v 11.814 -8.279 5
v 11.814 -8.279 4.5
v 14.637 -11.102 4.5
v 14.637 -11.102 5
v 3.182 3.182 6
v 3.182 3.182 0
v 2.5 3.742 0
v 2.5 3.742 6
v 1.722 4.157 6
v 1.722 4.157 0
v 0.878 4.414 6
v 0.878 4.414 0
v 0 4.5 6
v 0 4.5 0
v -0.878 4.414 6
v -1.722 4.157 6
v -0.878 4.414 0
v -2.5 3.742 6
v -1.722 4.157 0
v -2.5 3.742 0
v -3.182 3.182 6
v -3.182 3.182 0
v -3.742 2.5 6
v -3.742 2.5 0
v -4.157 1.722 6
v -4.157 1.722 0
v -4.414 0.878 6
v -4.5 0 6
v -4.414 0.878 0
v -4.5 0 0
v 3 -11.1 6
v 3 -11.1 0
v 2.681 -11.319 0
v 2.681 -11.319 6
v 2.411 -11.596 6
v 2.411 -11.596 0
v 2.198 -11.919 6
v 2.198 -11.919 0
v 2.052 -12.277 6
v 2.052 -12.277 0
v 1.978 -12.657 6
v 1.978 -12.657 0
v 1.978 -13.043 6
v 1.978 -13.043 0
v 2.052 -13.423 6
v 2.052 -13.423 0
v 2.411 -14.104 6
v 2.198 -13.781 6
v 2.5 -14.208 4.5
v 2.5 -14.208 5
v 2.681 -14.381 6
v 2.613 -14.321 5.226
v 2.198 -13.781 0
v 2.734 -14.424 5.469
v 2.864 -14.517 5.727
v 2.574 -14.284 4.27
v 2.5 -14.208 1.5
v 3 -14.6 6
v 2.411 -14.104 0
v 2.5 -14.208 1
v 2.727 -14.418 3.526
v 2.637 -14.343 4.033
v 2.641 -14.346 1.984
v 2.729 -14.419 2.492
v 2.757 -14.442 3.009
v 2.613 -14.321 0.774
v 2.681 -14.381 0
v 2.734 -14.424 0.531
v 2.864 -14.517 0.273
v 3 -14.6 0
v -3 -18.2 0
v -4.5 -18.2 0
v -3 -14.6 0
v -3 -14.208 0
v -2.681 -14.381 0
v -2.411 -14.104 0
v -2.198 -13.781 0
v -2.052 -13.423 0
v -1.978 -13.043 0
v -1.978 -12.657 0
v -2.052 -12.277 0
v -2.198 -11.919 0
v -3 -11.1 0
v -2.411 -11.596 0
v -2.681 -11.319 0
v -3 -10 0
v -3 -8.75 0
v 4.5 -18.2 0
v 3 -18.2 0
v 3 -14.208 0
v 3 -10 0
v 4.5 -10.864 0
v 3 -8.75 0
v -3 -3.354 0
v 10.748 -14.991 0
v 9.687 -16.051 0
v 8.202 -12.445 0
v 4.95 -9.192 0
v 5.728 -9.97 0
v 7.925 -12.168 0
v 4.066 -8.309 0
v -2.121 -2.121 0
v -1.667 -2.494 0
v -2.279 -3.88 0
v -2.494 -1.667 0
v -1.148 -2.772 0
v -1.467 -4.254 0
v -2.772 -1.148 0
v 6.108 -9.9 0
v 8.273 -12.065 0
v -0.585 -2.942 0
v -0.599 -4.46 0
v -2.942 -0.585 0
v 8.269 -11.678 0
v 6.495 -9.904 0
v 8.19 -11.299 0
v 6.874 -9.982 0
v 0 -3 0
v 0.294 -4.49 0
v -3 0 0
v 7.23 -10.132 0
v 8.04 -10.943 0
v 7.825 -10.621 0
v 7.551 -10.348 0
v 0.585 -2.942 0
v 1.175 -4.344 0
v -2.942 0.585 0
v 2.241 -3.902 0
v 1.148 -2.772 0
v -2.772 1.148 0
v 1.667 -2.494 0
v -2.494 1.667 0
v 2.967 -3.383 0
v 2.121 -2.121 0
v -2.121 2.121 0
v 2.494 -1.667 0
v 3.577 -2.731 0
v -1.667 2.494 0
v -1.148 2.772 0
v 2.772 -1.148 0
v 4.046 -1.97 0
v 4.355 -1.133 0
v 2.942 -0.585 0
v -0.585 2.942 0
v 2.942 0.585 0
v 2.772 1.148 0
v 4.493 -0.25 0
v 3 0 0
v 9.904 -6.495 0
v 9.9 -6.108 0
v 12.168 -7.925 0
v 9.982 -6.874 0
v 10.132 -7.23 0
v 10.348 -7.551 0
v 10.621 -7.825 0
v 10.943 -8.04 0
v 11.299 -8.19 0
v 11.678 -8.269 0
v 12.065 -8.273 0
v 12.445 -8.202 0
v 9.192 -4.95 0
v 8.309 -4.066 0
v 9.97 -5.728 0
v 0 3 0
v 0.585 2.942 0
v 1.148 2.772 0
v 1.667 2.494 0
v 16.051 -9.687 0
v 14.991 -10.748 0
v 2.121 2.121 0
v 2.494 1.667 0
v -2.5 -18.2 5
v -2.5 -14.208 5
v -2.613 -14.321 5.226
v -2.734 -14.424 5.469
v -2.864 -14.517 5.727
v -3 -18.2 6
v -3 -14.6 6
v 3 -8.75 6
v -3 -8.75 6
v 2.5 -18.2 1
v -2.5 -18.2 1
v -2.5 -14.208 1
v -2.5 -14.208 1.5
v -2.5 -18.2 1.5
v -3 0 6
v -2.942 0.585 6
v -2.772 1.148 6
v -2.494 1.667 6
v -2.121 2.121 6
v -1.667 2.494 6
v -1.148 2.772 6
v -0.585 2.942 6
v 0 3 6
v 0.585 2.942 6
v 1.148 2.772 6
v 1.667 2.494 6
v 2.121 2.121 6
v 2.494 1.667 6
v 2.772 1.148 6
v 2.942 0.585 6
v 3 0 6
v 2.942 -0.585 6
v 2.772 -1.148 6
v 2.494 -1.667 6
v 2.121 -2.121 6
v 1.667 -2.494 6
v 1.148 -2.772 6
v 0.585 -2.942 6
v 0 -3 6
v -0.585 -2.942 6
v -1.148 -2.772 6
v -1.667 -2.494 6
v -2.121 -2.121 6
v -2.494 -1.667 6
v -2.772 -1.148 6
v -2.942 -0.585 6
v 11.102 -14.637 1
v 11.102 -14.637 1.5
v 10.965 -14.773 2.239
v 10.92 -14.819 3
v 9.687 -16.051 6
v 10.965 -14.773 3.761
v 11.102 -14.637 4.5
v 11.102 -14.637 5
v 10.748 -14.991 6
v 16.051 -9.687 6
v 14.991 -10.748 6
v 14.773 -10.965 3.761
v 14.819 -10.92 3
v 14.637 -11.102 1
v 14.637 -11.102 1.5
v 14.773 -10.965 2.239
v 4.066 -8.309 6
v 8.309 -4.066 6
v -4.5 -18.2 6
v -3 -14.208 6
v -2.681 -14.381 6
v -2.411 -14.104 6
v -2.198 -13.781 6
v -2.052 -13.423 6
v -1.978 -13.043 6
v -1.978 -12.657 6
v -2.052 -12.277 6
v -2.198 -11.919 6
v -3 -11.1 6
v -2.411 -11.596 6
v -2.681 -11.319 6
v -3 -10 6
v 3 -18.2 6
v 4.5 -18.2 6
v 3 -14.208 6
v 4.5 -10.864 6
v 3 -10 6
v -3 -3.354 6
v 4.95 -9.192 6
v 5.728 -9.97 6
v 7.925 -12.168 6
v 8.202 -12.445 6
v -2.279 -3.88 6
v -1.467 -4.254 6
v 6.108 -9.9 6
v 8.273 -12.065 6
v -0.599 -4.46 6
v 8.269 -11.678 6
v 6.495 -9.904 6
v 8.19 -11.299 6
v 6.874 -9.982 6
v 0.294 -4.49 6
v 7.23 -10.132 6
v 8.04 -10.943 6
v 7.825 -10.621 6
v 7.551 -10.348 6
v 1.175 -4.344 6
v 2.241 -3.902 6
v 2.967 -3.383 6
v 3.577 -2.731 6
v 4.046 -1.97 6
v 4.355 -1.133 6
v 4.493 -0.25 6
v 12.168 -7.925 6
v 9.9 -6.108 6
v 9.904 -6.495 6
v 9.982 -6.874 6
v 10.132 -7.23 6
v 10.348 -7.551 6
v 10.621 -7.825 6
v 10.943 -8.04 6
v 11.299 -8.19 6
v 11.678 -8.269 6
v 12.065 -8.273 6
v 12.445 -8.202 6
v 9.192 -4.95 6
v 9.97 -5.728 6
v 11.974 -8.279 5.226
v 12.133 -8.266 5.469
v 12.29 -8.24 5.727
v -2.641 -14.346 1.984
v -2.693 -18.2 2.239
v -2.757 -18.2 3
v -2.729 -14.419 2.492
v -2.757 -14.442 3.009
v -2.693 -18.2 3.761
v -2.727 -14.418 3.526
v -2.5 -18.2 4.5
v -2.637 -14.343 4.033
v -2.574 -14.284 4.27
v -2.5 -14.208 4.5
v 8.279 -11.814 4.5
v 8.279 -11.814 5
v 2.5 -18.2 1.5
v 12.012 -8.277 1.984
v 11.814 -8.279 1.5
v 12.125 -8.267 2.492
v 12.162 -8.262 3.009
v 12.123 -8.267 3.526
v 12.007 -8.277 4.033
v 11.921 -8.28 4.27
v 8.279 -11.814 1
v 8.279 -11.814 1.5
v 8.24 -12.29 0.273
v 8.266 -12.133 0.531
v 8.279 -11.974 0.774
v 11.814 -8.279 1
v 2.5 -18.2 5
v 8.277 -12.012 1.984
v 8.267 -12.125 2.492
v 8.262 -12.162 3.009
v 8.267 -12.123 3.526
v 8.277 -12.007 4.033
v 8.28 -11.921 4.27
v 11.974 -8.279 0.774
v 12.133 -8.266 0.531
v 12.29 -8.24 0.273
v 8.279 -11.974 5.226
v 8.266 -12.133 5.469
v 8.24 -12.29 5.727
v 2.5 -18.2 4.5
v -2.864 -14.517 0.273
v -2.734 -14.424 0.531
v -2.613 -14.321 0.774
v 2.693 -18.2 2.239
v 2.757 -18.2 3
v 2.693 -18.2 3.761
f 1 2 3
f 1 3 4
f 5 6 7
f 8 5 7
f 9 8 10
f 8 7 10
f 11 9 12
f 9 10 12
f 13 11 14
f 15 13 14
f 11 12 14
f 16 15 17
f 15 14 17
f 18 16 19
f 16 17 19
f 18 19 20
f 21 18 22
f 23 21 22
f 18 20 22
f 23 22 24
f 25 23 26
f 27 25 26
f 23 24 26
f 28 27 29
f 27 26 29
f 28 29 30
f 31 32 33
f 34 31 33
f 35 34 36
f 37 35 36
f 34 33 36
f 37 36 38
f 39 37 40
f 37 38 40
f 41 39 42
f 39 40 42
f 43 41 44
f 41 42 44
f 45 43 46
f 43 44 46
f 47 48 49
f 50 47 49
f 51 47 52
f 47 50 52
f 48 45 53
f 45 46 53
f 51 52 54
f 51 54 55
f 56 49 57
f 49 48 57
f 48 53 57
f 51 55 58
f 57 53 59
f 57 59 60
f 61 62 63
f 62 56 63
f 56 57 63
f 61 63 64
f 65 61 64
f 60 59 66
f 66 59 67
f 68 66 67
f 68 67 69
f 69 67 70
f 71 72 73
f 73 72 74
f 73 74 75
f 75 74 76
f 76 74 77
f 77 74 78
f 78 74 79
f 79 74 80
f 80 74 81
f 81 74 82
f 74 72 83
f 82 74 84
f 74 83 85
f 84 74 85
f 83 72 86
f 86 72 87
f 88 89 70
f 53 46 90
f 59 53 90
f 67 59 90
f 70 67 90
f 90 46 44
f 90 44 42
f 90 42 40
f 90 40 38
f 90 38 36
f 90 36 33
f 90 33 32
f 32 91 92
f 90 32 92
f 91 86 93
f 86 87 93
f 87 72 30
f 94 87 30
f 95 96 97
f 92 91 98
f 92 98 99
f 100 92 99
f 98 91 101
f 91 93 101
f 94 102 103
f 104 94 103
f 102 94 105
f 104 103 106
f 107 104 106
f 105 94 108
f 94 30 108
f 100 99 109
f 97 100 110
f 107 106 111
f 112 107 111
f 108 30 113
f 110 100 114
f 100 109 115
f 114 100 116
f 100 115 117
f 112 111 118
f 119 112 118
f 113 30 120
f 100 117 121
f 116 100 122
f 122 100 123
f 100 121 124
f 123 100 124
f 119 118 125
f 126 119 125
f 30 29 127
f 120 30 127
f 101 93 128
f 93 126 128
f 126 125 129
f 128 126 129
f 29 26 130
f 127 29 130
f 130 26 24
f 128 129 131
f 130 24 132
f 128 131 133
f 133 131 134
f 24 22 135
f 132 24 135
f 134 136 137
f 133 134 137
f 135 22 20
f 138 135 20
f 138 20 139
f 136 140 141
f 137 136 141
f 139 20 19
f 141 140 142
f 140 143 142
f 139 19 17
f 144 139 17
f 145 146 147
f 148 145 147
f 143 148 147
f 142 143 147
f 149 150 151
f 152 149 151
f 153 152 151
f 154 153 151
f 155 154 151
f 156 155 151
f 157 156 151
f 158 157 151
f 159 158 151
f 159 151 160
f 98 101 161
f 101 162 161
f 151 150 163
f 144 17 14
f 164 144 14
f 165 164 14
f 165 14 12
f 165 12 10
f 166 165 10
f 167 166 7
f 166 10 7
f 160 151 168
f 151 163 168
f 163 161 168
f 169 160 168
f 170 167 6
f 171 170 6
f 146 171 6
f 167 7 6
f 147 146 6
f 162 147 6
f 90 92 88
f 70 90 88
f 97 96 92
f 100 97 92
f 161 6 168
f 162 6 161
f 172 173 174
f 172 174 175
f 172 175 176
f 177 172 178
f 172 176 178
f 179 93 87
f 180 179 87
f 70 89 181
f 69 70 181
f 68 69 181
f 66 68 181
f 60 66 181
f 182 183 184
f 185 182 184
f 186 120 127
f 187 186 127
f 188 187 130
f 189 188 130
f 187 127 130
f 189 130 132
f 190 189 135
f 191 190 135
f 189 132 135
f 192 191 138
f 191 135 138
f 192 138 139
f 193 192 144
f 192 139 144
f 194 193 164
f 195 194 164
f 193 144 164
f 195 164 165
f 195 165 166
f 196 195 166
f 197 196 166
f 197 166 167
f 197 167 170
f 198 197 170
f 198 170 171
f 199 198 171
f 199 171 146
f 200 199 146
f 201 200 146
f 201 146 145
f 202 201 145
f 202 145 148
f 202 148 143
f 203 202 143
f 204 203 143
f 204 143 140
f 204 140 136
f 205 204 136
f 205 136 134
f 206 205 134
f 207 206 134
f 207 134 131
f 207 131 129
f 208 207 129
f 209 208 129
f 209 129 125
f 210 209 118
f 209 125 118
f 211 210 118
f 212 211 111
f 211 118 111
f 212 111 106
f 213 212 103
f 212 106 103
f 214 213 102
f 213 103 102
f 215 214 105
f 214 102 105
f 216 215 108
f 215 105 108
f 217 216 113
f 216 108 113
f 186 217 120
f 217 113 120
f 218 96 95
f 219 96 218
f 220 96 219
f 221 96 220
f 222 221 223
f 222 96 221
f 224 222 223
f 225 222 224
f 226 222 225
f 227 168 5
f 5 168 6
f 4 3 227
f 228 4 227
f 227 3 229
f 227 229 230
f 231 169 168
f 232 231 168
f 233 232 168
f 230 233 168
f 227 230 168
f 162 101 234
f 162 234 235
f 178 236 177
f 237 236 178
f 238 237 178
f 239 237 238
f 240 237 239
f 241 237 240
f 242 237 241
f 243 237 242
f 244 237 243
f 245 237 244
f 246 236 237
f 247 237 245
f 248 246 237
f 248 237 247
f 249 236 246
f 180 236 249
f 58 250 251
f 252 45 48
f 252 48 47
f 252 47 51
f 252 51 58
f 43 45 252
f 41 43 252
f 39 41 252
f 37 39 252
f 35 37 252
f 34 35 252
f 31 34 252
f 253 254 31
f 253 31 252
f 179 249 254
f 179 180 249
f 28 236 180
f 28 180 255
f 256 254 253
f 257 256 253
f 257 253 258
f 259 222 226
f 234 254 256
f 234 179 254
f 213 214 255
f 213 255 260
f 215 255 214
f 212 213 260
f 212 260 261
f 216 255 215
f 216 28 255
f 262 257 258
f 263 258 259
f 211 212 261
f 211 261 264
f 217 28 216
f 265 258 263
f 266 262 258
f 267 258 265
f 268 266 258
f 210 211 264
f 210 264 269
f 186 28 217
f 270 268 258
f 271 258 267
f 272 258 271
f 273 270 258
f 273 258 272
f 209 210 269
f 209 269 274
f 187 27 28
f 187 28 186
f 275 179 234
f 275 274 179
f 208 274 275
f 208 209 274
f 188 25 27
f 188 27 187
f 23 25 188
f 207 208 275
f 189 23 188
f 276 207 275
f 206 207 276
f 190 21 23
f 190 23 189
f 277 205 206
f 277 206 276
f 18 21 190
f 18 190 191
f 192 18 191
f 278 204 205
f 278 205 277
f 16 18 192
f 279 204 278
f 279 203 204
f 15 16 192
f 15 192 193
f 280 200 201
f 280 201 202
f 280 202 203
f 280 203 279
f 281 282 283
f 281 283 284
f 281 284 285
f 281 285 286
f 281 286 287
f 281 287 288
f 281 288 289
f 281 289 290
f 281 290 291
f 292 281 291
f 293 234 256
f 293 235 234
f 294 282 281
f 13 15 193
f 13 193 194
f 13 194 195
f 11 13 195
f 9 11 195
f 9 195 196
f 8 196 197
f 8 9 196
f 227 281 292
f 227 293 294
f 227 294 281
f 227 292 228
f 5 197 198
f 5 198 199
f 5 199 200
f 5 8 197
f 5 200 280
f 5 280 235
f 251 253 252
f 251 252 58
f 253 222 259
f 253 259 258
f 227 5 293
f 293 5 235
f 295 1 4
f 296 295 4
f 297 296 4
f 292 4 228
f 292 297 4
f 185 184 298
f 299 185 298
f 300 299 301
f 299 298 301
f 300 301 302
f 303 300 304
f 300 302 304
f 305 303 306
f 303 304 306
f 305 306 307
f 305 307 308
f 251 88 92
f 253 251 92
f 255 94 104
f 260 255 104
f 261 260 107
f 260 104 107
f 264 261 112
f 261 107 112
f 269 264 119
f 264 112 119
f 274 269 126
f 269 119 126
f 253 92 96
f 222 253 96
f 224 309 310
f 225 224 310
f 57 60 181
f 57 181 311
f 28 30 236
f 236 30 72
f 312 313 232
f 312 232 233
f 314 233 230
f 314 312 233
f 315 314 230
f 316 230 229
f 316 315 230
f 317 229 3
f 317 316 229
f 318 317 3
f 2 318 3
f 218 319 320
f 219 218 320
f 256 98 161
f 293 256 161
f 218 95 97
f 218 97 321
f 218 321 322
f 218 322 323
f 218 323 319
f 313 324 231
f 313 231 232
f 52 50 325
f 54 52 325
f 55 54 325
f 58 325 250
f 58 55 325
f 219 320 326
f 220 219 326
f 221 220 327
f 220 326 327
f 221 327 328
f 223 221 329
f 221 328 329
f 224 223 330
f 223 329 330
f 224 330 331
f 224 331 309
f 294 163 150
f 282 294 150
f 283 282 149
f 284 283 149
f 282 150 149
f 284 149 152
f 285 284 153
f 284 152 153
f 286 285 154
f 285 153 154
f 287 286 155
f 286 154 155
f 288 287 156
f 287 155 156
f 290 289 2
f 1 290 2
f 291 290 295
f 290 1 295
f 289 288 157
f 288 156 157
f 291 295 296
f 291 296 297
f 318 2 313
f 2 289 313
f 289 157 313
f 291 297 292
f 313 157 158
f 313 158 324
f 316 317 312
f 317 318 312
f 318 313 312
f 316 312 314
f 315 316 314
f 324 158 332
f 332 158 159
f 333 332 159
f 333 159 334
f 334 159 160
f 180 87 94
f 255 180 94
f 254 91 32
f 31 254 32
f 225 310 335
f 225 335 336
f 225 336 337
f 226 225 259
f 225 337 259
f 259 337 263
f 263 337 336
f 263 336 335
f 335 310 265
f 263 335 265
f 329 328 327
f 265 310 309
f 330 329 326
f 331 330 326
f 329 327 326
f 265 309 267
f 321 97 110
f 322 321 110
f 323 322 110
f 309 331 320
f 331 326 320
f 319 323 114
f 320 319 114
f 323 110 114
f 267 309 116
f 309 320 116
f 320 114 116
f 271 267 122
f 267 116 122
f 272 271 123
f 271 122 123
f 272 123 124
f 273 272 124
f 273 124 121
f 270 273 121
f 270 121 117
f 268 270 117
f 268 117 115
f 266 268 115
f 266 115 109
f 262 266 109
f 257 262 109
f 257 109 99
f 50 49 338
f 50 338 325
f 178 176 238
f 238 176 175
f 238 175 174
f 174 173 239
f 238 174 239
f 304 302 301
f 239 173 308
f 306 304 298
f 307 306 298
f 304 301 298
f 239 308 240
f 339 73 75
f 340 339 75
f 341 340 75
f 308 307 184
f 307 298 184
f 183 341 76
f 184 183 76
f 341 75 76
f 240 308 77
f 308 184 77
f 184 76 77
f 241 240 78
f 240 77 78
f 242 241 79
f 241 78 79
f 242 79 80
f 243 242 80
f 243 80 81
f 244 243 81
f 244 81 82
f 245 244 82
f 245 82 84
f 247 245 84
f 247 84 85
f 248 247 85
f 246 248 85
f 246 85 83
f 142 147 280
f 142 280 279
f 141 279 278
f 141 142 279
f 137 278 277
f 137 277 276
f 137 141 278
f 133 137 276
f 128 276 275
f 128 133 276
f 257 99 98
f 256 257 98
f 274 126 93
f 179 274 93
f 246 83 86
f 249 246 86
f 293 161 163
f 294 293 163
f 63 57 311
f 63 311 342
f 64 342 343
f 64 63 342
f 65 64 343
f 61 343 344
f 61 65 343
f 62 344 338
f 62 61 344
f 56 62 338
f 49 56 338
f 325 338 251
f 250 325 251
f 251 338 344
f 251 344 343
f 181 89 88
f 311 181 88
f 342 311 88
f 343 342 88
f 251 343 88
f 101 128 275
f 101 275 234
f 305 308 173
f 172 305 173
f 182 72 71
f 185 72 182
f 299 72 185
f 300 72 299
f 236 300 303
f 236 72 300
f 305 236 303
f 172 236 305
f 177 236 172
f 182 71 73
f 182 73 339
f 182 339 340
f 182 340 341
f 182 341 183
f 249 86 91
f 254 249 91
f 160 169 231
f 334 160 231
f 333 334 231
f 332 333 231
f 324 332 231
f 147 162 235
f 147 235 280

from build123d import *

# Parameters (mm, degrees)
EXTRUDE_1_DEPTH          = 6
EXTRUDE_2_REACH          = 25.907
PATTERN_CIRCULAR_1_COUNT = 2
PATTERN_CIRCULAR_1_ANGLE = 45
SKETCH_4_R               = 3
CUT_EXTRUDE_2_DEPTH      = 25.997699991


with BuildPart() as part:
    # 草图1 → 凸台-拉伸1 (new body)
    with BuildSketch(Plane.XY):
        with BuildLine():
            Line((-4.5, 0), (-4.5, -18.2))
            Line((-4.5, -18.2), (-3, -18.2))
            Line((-3, -18.2), (-3, -14.6))
            ThreePointArc((-3, -14.6), (-1.968245837, -12.85), (-3, -11.1))
            Line((-3, -11.1), (-3, -10))
            Line((-3, -10), (3, -10))
            Line((3, -10), (3, -11.1))
            ThreePointArc((3, -11.1), (1.968245837, -12.85), (3, -14.6))
            Line((3, -14.6), (3, -18.2))
            Line((3, -18.2), (4.5, -18.2))
            Line((4.5, -18.2), (4.5, 0))
            ThreePointArc((4.5, 0), (0, 4.5), (-4.5, 0))
        make_face()
    extrude_1 = extrude(amount=EXTRUDE_1_DEPTH)

    # 草图3 → 凸台-拉伸2 (add, up to next)
    with BuildSketch(Plane.XZ.offset(18.2), mode=Mode.PRIVATE) as extrude_2_sk1:
        with BuildLine():
            Line((-3, 6), (-3, 0))
            Line((-3, 0), (-2.5, 1))
            Line((-2.5, 1), (-2.5, 1.5))
            ThreePointArc((-2.5, 1.5), (-2.757359313, 3), (-2.5, 4.5))
            Line((-2.5, 4.5), (-2.5, 5))
            Line((-2.5, 5), (-3, 6))
        make_face()
    extrude_2_tool1 = extrude(extrude_2_sk1.sketch, amount=-EXTRUDE_2_REACH, mode=Mode.PRIVATE) - part.part
    # 草图3 → 凸台-拉伸2 (add, up to next)
    with BuildSketch(Plane.XZ.offset(18.2), mode=Mode.PRIVATE) as extrude_2_sk2:
        with BuildLine():
            Line((3, 0), (2.5, 1))
            Line((2.5, 1), (2.5, 1.5))
            ThreePointArc((2.5, 1.5), (2.757359313, 3), (2.5, 4.5))
            Line((2.5, 4.5), (2.5, 5))
            Line((2.5, 5), (3, 6))
            Line((3, 6), (3, 0))
        make_face()
    extrude_2_tool2 = extrude(extrude_2_sk2.sketch, amount=-EXTRUDE_2_REACH, mode=Mode.PRIVATE) - part.part
    extrude_2_1 = extrude_2_tool1.solids().sort_by_distance((-2.809362, -18.2, 3))[0]
    add(extrude_2_1)
    extrude_2_2 = extrude_2_tool2.solids().sort_by_distance((2.809362, -18.2, 3))[0]
    add(extrude_2_2)
    extrude_2 = extrude_2_1 + extrude_2_2  # 凸台-拉伸2 as one shape, for the pattern or mirror that repeats it

    # 阵列(圆周)1: 凸台-拉伸1, 凸台-拉伸2 ×2 about axis
    pattern_circular_1_axis = Axis((0, 0, 0), (0, 0, 1))
    add([extrude_1.rotate(pattern_circular_1_axis, i * PATTERN_CIRCULAR_1_ANGLE / (PATTERN_CIRCULAR_1_COUNT - 1)) for i in range(1, PATTERN_CIRCULAR_1_COUNT)])
    add([extrude_2.rotate(pattern_circular_1_axis, i * PATTERN_CIRCULAR_1_ANGLE / (PATTERN_CIRCULAR_1_COUNT - 1)) for i in range(1, PATTERN_CIRCULAR_1_COUNT)])

    # 草图4 → 切除-拉伸2 (cut, through all)
    with BuildSketch(Plane(origin=(0, 0, 0), x_dir=(-1, 0, 0), z_dir=(0, 0, -1))):
        Circle(SKETCH_4_R)
        with BuildLine():
            Line((3, -8.75), (3, -3.354101966))
            ThreePointArc((3, -3.354101966), (1.038095674, -4.378625055), (-1.174936357, -4.343906601))
            Line((-1.174936357, -4.343906601), (-3, -8.75))
            Line((-3, -8.75), (3, -8.75))
        make_face()
        with BuildLine():
            Line((-8.308504679, -4.065863992), (-4.493028589, -0.250387902))
            ThreePointArc((-4.493028589, -0.250387902), (-3.830199959, -2.362110978), (-2.240800349, -3.90241128))
            Line((-2.240800349, -3.90241128), (-4.065863992, -8.308504679))
            Line((-4.065863992, -8.308504679), (-8.308504679, -4.065863992))
        make_face()
    extrude(amount=-CUT_EXTRUDE_2_DEPTH, mode=Mode.SUBTRACT)


solid = part.part
